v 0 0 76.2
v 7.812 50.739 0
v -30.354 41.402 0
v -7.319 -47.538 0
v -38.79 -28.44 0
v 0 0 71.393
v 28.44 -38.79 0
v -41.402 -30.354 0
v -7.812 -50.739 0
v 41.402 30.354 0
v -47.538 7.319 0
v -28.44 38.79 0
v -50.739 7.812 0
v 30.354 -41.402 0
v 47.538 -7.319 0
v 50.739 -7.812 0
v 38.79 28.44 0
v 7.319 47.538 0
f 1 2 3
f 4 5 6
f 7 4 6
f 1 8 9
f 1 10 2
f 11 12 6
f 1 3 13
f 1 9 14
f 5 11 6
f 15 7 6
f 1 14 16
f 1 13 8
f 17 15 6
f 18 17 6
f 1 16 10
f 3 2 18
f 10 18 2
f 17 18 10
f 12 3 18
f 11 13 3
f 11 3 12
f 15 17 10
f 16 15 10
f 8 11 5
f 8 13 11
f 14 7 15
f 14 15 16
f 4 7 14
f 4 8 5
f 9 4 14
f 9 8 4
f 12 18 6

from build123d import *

# Parameters (mm, degrees)
F4_T = -2.54


with BuildPart() as f3:
    # F0 (on Top) → F3 section 0
    with BuildSketch(Plane.XY, mode=Mode.PRIVATE) as f3_s0:
        Polygon((-30.354286, 41.401532), (-50.739026, 7.811583), (-41.401532, -30.354286), (-7.811583, -50.739026), (30.354286, -41.401532), (50.739026, -7.811583), (41.401532, 30.354286), (7.811583, 50.739026), align=None)
    loft([f3_s0.sketch, Vertex(0, 0, 76.2)])

    # F4
    f4_openings = [f3.faces().sort_by_distance(p)[0] for p in [
        (0, 0, 0),
    ]]
    offset(amount=F4_T, openings=f4_openings)


solid = f3.part
